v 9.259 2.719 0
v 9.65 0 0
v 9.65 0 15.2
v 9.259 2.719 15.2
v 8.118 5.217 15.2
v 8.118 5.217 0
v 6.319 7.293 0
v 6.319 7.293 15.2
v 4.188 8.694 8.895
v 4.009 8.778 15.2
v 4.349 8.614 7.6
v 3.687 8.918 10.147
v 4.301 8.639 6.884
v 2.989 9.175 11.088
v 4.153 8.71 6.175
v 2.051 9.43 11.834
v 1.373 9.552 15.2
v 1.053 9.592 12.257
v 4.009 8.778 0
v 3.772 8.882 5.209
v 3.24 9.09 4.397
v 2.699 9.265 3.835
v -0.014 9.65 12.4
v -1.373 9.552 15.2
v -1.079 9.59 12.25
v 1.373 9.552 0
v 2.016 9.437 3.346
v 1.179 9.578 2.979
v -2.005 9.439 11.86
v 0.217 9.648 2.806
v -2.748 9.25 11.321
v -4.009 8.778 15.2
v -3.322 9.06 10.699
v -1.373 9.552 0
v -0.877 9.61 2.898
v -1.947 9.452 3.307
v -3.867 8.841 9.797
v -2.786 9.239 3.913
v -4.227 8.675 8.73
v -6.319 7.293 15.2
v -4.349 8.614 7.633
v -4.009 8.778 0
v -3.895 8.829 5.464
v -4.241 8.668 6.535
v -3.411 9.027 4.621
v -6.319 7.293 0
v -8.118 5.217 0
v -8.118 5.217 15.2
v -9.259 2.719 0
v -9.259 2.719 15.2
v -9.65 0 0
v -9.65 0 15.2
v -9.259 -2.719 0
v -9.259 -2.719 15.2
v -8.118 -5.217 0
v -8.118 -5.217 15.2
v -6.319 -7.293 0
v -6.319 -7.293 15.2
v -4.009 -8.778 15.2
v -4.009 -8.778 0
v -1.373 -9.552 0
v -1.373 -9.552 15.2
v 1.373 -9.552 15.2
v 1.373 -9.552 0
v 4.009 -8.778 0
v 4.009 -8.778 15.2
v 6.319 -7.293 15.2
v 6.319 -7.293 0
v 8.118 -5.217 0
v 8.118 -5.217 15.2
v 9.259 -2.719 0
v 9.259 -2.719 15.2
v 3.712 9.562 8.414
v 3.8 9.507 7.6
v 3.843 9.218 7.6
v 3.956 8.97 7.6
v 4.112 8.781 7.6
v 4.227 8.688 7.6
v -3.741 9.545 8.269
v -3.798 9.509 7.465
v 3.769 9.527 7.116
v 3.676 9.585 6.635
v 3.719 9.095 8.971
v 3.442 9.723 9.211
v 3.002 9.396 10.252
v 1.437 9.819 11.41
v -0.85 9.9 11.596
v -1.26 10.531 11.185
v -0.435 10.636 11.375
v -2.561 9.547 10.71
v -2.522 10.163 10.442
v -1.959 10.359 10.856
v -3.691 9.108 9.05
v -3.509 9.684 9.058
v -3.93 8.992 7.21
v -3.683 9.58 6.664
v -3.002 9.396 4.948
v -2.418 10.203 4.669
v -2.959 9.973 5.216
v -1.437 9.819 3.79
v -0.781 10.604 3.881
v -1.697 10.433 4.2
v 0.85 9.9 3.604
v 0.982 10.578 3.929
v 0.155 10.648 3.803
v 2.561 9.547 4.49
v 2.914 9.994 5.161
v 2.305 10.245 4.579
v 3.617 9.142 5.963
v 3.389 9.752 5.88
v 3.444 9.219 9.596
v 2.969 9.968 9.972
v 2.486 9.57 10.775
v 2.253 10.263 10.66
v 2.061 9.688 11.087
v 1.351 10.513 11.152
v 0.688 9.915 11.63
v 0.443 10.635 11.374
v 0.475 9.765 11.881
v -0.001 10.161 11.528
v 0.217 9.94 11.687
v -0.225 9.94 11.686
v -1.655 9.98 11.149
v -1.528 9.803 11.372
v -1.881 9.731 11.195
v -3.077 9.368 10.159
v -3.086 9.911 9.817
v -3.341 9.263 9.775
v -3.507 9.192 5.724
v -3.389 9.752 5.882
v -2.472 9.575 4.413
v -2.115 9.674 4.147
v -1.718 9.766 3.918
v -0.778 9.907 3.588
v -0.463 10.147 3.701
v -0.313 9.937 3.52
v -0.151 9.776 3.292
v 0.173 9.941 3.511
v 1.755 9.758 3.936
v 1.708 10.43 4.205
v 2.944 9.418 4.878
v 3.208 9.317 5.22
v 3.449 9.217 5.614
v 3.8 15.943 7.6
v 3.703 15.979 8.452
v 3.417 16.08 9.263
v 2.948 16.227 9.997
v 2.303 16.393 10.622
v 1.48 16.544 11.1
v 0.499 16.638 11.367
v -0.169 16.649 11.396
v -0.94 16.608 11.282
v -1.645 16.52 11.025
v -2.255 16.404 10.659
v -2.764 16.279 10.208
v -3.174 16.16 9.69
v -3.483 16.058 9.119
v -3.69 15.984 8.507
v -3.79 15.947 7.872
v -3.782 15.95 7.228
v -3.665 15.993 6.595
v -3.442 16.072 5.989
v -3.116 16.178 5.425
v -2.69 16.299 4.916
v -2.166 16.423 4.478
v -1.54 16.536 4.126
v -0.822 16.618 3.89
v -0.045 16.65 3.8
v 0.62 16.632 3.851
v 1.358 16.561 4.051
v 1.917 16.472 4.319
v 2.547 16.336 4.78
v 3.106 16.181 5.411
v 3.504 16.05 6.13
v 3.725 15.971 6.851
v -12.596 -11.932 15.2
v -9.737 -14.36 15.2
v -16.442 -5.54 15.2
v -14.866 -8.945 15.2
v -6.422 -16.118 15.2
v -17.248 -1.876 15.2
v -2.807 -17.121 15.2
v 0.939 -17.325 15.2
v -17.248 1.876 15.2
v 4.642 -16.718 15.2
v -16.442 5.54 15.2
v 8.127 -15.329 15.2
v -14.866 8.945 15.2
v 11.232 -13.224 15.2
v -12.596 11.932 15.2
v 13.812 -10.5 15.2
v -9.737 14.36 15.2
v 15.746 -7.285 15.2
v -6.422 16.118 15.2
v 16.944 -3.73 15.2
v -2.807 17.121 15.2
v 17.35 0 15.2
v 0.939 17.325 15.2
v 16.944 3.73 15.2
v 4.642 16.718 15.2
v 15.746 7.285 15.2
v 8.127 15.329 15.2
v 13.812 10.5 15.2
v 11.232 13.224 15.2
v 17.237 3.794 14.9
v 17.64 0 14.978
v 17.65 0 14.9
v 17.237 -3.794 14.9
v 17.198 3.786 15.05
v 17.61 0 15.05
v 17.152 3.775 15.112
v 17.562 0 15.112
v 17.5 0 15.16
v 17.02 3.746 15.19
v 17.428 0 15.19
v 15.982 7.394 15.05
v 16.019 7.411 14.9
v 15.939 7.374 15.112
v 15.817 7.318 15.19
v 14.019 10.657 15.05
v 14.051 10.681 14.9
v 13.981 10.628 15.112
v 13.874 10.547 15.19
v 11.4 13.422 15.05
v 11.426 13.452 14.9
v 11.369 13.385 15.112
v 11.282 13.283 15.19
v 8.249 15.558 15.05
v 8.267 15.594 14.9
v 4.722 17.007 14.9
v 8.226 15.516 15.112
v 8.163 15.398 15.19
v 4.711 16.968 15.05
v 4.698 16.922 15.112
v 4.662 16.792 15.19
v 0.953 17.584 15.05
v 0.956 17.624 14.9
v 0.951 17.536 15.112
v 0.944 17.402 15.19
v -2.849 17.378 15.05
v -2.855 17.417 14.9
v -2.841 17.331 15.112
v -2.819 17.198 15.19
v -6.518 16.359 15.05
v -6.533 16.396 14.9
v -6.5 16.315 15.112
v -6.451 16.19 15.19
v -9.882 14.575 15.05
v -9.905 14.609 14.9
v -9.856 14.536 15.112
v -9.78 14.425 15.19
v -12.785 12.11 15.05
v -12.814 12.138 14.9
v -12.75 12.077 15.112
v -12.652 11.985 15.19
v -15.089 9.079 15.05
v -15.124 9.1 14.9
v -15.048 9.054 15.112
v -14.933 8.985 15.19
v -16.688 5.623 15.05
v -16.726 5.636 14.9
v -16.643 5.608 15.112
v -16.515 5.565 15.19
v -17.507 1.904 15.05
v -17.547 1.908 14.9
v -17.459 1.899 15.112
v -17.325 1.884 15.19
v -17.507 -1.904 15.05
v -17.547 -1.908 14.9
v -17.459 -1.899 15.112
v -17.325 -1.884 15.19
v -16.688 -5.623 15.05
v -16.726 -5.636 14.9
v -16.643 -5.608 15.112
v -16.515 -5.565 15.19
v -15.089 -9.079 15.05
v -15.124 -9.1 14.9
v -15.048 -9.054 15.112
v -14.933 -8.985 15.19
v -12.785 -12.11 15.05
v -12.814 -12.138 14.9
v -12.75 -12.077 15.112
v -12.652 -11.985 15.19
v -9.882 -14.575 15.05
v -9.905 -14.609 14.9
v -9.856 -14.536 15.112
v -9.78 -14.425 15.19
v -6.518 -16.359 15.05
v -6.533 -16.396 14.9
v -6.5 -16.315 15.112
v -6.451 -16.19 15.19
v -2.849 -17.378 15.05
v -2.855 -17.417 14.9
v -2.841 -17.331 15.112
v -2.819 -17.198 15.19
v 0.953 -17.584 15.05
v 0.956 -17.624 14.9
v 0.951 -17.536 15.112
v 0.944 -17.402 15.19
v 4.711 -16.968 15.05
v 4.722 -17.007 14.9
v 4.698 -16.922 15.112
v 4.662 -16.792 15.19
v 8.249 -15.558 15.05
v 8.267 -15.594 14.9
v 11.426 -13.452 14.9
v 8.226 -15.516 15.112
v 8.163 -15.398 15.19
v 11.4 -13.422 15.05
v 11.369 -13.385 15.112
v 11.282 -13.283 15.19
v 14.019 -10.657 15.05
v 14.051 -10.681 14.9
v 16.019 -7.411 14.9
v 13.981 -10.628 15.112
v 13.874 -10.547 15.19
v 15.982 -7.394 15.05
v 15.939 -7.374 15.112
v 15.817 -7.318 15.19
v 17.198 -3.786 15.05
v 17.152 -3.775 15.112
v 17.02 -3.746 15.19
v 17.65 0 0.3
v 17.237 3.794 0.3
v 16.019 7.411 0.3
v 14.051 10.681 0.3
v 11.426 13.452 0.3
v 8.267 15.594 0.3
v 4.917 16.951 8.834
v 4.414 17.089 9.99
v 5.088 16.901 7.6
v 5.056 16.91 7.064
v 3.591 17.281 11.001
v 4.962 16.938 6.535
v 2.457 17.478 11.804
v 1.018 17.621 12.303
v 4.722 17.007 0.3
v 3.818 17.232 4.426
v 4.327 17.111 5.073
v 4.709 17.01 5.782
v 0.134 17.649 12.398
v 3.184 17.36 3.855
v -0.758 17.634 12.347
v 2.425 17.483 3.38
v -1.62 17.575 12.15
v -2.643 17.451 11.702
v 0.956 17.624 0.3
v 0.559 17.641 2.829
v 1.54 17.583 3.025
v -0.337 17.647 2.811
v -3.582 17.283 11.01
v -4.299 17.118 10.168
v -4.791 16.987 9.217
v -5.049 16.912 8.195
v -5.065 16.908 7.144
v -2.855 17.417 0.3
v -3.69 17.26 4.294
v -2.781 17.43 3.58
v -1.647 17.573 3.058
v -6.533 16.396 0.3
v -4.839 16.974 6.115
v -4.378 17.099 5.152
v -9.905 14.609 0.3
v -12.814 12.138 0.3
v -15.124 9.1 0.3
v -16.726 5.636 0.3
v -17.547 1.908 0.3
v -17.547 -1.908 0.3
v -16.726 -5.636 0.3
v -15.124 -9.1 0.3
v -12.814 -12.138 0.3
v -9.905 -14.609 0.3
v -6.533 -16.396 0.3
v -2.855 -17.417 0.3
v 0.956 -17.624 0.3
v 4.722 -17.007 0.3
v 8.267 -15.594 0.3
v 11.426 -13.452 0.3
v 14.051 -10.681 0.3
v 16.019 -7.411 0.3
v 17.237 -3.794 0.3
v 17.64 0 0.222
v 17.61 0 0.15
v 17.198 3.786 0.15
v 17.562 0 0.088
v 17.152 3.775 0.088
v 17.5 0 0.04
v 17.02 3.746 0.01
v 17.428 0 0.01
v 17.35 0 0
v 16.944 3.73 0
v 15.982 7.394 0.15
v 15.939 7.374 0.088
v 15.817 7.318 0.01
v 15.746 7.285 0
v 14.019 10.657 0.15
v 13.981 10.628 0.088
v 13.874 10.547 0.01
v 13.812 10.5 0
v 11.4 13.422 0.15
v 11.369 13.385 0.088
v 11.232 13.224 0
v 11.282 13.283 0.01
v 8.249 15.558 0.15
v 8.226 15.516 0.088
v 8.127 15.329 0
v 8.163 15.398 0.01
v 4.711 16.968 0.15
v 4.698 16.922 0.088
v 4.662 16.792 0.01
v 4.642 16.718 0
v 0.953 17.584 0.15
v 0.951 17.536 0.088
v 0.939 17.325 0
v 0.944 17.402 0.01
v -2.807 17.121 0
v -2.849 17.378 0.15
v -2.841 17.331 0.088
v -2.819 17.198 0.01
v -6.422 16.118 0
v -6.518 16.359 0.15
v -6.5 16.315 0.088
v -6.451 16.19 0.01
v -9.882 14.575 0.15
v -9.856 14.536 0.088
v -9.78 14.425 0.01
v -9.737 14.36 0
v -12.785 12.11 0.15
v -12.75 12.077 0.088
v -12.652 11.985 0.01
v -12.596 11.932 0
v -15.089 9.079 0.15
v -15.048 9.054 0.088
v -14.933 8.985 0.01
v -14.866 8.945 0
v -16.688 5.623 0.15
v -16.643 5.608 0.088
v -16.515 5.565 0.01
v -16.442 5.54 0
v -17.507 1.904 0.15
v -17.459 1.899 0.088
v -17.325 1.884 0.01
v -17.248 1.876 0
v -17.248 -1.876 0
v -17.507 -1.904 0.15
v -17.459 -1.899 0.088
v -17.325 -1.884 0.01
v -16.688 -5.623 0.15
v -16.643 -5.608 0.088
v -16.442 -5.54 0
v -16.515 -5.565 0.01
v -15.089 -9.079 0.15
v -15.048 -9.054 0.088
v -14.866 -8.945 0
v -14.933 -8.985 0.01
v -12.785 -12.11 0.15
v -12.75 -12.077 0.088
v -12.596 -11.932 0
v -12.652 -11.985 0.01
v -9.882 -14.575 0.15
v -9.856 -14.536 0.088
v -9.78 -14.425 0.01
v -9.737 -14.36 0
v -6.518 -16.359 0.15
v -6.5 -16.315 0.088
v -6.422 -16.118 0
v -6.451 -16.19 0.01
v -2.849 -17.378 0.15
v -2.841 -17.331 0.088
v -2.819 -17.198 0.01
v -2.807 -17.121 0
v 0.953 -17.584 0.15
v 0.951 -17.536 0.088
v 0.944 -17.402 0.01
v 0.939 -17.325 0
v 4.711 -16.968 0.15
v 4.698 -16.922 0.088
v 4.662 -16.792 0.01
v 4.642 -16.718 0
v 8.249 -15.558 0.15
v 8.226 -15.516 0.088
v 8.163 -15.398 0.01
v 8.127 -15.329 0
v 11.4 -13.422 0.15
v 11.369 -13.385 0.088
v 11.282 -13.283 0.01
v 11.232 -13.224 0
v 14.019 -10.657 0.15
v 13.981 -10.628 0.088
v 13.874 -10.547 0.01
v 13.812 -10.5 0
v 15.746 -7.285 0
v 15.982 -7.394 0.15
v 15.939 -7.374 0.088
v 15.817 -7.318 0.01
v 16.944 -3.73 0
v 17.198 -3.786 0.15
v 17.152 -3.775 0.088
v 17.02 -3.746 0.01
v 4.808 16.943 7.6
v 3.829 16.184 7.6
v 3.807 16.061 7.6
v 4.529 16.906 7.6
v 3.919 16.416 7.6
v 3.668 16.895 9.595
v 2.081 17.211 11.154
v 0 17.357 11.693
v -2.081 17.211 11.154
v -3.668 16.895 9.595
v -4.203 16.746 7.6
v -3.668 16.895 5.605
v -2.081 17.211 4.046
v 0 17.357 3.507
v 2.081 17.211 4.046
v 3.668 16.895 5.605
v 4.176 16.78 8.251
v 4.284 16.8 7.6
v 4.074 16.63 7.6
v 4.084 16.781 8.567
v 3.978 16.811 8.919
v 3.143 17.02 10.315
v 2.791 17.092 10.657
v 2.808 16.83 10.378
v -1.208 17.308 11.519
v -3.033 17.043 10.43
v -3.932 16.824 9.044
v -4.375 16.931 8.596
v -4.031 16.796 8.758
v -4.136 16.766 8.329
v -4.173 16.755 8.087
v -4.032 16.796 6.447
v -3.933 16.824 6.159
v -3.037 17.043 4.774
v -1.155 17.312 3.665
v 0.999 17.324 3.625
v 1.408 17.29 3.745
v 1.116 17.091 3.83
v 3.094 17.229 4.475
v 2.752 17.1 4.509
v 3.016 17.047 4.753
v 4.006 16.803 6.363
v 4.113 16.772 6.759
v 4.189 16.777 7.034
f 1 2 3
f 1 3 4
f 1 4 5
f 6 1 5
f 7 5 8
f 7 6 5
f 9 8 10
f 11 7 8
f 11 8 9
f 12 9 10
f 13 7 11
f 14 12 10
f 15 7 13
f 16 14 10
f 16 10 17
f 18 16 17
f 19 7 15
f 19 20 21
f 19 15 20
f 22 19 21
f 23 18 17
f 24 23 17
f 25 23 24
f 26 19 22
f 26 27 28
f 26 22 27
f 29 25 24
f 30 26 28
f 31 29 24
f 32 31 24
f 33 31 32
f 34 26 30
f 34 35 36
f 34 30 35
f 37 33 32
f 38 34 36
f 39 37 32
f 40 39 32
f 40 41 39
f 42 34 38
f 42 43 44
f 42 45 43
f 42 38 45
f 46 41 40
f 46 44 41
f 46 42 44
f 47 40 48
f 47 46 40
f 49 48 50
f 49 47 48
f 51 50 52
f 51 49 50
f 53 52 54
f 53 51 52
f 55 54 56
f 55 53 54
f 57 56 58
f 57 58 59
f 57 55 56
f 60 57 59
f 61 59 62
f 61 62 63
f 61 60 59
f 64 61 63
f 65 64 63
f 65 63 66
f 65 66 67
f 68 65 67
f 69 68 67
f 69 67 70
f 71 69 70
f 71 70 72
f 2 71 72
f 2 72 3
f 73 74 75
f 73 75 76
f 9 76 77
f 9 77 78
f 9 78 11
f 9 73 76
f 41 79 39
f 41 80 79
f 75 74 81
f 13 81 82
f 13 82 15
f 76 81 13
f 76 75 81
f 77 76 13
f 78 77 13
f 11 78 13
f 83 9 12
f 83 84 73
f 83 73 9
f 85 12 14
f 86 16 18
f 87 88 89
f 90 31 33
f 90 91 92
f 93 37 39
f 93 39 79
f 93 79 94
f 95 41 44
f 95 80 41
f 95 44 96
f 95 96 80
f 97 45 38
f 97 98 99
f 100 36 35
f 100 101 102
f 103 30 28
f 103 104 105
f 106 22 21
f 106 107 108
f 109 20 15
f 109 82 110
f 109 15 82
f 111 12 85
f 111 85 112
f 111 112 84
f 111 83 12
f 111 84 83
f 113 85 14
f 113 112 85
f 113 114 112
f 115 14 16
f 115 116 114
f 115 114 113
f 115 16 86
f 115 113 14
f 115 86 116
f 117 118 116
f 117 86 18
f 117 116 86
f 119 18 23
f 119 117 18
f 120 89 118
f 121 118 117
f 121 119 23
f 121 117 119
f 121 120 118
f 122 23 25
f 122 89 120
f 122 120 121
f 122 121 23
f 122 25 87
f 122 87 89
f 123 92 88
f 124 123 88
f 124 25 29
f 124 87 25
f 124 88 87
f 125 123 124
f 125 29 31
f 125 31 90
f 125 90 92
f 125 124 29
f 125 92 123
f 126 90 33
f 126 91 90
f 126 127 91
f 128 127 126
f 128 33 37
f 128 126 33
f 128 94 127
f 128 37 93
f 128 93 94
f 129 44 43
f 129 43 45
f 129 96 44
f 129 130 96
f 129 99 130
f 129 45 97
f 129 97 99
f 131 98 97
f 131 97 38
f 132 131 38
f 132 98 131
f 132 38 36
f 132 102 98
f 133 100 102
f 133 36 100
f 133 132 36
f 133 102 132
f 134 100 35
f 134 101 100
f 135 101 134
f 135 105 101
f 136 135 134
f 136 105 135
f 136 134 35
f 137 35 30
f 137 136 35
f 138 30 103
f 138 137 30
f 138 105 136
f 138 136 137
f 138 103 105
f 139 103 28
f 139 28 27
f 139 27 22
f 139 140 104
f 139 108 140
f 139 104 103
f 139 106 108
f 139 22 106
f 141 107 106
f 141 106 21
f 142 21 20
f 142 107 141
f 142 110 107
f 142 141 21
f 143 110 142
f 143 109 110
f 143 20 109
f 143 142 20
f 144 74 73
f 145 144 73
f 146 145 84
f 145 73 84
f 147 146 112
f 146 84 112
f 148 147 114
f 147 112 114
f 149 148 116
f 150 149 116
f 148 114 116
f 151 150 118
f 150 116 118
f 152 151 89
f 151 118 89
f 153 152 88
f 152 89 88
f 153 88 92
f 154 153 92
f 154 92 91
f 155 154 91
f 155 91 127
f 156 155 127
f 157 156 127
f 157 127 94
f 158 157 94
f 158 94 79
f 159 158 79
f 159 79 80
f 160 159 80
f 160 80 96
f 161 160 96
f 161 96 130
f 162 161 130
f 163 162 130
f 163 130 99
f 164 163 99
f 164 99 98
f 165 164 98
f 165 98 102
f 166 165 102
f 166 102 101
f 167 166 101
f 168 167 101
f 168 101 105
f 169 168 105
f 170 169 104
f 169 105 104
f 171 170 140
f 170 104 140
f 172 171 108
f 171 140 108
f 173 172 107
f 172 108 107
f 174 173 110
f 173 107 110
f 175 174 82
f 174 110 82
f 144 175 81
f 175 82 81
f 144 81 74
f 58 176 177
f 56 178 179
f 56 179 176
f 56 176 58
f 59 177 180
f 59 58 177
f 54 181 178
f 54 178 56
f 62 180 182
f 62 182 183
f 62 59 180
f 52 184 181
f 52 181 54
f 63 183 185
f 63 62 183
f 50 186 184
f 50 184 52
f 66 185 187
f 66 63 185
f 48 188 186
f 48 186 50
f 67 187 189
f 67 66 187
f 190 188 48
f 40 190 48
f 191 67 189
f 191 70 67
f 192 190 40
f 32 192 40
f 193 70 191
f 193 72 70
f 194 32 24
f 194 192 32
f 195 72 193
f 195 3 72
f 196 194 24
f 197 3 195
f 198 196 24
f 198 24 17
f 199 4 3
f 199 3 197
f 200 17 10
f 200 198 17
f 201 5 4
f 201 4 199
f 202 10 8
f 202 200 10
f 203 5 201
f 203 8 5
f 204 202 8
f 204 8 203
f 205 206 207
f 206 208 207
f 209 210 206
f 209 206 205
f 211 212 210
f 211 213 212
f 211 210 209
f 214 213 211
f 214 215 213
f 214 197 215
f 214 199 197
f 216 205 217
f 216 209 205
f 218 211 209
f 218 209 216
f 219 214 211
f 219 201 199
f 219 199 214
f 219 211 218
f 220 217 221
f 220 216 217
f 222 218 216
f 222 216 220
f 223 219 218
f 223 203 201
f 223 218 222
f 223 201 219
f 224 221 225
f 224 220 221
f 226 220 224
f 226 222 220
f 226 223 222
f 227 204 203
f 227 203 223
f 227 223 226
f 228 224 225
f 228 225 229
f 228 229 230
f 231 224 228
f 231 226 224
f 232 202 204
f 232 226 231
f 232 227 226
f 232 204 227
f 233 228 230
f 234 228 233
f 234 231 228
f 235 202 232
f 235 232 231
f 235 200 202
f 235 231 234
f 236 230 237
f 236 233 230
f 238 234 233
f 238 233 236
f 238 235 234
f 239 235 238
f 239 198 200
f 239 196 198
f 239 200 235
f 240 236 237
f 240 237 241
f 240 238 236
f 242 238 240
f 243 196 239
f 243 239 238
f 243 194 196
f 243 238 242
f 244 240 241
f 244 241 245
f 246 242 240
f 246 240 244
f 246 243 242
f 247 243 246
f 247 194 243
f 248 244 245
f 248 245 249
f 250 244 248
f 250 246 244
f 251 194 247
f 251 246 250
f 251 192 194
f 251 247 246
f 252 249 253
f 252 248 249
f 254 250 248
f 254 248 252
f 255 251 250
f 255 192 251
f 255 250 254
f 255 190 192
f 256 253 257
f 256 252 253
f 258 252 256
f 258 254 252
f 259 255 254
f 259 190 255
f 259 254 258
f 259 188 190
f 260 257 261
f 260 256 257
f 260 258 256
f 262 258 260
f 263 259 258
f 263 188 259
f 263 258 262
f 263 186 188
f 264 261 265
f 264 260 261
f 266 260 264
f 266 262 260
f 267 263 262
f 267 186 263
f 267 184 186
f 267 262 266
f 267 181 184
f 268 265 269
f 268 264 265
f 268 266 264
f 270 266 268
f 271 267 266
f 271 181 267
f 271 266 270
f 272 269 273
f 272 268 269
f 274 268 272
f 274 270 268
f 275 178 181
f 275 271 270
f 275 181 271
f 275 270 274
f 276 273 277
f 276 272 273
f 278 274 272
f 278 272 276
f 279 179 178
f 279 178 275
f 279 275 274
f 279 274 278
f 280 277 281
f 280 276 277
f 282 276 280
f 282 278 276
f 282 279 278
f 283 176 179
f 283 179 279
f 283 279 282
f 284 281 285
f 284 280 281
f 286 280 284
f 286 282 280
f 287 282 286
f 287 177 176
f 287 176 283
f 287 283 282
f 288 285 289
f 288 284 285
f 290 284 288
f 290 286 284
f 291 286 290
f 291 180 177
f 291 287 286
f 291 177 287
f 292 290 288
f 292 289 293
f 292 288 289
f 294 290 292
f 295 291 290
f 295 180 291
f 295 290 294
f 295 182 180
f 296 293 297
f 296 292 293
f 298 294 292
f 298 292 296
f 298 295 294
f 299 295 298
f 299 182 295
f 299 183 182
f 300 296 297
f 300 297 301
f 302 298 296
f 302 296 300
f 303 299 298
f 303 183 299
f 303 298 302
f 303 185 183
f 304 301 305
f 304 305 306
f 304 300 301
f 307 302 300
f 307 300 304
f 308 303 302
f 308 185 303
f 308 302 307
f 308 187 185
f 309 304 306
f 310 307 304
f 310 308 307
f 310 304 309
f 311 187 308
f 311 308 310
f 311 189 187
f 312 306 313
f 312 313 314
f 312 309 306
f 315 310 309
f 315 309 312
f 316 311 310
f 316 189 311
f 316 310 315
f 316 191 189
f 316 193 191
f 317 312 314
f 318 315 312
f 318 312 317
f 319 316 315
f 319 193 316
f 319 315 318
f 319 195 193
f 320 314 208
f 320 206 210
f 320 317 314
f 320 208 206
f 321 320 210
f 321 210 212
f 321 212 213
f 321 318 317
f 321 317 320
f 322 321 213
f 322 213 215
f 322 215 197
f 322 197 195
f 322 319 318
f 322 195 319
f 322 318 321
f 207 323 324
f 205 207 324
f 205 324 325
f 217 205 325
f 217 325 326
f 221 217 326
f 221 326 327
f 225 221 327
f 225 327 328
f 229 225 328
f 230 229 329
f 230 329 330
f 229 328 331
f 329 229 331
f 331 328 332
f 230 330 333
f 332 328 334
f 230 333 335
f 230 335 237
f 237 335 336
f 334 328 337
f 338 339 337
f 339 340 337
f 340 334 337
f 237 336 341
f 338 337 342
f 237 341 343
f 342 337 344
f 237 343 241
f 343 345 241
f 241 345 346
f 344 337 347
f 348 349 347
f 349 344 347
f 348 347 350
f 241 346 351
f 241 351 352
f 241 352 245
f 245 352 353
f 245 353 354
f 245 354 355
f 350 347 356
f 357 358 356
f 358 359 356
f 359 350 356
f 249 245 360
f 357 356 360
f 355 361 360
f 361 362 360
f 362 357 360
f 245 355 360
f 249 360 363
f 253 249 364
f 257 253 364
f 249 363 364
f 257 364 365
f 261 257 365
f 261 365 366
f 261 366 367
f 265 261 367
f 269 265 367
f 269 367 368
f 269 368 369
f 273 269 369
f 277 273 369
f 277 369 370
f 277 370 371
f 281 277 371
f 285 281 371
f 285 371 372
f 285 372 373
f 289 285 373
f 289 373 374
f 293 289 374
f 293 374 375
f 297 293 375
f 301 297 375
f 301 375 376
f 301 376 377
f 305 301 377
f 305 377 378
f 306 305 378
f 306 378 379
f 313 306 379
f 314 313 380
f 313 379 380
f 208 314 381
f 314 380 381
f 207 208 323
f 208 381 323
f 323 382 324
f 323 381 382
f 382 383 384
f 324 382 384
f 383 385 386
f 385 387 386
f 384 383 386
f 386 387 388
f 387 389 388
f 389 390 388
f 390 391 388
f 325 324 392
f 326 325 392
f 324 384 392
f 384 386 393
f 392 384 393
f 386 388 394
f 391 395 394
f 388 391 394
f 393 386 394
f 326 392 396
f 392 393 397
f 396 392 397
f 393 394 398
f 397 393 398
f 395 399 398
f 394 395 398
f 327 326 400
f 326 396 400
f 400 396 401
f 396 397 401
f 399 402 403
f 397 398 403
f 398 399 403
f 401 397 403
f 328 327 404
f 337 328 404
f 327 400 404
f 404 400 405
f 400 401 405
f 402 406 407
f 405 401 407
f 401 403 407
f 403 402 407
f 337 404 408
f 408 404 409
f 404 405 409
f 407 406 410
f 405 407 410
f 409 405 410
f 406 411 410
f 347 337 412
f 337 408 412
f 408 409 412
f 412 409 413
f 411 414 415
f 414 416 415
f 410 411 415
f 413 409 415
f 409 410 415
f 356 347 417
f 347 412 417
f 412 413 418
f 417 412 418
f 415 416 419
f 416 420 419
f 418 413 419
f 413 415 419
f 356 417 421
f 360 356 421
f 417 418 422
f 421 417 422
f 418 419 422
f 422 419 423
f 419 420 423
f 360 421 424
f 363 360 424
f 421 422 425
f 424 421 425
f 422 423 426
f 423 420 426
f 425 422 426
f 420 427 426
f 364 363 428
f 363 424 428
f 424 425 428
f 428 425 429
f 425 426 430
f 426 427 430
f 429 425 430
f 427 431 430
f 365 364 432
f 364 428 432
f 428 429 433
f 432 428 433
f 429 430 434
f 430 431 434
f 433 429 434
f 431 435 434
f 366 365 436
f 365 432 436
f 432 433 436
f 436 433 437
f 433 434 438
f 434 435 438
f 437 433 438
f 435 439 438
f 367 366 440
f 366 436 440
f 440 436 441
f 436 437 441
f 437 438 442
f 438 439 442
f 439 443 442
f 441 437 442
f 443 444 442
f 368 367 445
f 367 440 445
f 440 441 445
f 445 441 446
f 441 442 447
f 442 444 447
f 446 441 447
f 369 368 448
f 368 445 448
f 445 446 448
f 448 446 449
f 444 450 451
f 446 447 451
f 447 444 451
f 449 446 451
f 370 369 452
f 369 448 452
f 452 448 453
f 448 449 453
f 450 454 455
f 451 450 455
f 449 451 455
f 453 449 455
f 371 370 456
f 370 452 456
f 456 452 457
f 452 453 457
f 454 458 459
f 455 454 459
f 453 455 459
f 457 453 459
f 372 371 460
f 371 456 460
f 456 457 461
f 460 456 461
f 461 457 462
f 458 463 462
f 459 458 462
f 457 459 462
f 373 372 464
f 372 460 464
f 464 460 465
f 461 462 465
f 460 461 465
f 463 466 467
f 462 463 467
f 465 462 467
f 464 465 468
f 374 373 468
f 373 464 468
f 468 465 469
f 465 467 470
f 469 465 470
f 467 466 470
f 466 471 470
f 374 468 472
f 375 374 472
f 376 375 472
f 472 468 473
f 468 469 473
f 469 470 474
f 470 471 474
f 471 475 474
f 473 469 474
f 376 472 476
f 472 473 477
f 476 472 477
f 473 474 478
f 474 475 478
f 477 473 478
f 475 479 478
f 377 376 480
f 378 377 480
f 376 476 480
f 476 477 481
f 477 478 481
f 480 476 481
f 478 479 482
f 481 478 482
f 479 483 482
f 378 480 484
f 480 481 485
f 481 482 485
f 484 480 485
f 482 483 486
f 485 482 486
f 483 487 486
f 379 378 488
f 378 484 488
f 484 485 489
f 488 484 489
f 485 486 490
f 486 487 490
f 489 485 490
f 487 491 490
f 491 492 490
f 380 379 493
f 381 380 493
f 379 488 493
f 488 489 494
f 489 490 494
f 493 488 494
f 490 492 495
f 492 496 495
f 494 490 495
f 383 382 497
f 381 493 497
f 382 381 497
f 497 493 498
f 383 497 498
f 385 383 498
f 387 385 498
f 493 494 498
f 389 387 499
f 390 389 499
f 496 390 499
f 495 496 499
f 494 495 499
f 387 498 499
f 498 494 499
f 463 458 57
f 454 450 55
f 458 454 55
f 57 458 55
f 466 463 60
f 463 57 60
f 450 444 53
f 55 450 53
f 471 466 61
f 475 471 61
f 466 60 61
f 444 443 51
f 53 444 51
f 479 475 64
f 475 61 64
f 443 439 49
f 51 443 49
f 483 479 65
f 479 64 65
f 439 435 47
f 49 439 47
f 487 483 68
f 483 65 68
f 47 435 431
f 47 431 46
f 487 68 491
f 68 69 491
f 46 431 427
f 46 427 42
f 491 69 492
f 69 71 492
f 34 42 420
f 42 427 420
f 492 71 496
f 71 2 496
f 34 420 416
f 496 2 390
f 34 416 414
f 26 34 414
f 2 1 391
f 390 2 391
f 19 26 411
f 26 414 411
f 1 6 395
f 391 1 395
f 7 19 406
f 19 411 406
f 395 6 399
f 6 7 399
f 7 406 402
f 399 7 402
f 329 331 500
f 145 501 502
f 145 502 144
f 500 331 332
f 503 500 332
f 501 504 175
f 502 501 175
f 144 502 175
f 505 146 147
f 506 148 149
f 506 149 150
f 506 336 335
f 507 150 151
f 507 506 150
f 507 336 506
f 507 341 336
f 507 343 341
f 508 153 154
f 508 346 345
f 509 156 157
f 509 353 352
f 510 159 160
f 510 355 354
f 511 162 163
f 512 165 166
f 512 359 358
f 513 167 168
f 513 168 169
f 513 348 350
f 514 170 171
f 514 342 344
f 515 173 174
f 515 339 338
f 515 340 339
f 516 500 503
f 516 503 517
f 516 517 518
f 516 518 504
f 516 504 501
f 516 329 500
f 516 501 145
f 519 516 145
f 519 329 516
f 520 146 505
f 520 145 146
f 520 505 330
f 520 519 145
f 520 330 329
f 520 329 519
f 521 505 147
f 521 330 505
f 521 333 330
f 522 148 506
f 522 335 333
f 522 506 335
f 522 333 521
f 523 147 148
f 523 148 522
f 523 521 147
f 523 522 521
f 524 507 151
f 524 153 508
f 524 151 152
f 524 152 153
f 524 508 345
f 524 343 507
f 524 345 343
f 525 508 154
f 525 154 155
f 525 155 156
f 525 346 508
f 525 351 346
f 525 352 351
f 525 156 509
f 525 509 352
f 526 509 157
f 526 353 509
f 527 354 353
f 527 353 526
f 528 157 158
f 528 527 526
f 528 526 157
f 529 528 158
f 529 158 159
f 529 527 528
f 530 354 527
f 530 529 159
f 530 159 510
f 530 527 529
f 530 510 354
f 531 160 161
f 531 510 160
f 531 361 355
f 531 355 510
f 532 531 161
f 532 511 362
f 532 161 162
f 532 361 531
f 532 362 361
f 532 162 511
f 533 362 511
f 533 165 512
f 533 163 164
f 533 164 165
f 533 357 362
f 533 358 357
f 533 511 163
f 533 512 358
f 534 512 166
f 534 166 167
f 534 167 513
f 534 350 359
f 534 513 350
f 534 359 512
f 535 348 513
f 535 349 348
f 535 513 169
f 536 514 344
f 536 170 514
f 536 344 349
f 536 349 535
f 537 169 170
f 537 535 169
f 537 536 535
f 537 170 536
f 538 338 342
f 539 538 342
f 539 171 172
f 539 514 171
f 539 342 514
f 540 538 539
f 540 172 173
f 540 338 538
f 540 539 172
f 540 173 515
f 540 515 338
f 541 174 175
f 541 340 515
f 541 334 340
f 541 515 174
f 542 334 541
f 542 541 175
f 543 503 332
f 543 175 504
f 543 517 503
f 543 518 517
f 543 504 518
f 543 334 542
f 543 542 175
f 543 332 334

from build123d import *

# Parameters (mm, degrees)
F0_R     = 17.65
F0_R_2   = 9.65
F1_DEPTH = 15.2
F2_R     = 0.3
F3_R     = 3.8
F4_DEPTH = 24
F5_R     = 1
F6_R     = 1


with BuildPart() as f1:
    # F0 (on Top) → F1 (new body)
    with BuildSketch(Plane.XY):
        Circle(F0_R)
        Circle(F0_R_2, mode=Mode.SUBTRACT)
    extrude(amount=F1_DEPTH)

    # F2
    f2_edges = [f1.edges().sort_by_distance(p)[0] for p in [
        (-17.65, 0, 15.2),
        (17.65, 0, 7.6),
        (-17.65, 0, 0),
    ]]
    fillet(f2_edges, radius=F2_R)

    # F3 (on Front) → F4 (cut)
    with BuildSketch(Plane.XZ):
        with Locations((0, 7.6)):
            Circle(F3_R)
    extrude(amount=-F4_DEPTH, mode=Mode.SUBTRACT)

    # F5
    f5_edges = [f1.edges().sort_by_distance(p)[0] for p in [
        (-3.8, 17.236081, 7.6),
    ]]
    fillet(f5_edges, radius=F5_R)

    # F6
    f6_edges = [f1.edges().sort_by_distance(p)[0] for p in [
        (-3.8, 8.870316, 7.6),
    ]]
    fillet(f6_edges, radius=F6_R)


solid = f1.part
